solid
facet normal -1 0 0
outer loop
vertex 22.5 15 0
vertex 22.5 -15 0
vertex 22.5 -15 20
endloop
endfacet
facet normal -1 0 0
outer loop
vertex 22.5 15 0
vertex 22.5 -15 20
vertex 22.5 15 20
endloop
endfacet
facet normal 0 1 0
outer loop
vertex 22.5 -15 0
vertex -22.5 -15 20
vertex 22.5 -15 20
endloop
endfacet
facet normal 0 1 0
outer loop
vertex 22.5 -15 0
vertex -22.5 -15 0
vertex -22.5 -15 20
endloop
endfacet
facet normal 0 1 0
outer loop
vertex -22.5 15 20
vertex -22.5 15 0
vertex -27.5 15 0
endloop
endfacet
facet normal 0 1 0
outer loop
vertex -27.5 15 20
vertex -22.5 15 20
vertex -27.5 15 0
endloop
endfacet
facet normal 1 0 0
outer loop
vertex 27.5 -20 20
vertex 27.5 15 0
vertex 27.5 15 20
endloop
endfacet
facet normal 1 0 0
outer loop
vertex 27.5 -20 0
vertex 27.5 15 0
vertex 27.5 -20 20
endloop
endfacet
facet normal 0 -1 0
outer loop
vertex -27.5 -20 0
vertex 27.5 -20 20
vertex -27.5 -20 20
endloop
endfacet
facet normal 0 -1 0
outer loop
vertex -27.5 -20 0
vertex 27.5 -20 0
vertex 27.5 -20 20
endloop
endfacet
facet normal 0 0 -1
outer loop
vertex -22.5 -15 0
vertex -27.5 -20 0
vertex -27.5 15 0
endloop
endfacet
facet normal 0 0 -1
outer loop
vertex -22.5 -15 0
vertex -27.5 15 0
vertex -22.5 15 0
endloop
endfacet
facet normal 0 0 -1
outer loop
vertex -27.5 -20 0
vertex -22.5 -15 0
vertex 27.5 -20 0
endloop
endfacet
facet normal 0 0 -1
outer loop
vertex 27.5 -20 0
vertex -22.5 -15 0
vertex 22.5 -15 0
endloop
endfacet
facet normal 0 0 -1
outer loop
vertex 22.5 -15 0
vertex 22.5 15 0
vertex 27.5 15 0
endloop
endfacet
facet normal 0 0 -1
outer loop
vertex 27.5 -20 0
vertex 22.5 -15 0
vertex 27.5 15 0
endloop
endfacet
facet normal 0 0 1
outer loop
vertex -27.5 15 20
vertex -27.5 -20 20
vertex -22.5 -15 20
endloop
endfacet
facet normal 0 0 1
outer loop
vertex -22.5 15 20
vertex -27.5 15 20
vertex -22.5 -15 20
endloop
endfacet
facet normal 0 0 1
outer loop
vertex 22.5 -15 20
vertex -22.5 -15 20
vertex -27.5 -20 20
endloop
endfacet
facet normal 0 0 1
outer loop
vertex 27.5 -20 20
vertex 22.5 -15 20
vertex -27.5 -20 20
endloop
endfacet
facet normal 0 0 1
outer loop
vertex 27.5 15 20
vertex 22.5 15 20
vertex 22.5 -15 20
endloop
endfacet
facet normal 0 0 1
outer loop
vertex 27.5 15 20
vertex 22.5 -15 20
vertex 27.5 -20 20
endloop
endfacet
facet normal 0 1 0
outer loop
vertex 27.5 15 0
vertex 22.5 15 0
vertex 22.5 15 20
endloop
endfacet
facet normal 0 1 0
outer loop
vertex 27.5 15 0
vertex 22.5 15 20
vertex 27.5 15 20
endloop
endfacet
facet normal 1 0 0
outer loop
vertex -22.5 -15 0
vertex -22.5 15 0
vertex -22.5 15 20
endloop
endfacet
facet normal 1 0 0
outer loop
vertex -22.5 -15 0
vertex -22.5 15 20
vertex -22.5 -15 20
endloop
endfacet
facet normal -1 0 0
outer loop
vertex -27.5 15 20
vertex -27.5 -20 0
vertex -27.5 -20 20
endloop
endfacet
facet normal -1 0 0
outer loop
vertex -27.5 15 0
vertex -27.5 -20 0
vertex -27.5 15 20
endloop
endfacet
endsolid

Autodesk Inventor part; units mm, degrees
ref_plane "YZ Plane" through (0, 0, 0) normal (1, 0, 0) x (0, 1, 0)
ref_plane "XZ Plane" through (0, 0, 0) normal (0, 1, 0) x (-1, 0, 0)
ref_plane "XY Plane" through (0, 0, 0) normal (0, 0, 1) x (1, 0, 0)
sketch "Sketch1" plane through (0, 0, 0) normal (0, 0, 1) x (1, 0, 0)
  line L0 (22.5, 15) -> (-22.5, 15) construction
  line L1 (-22.5, 15) -> (-22.5, -15)
  line L2 (-22.5, -15) -> (22.5, -15)
  line L3 (22.5, -15) -> (22.5, 15)
  line L4 (22.5, 15) -> (-22.5, -15) construction
  line L5 (-22.5, 15) -> (22.5, -15) construction
  line L6 (-27.5, -20) -> (-27.5, 15)
  line L7 (-27.5, 20) -> (27.5, 20) construction
  line L8 (27.5, 20) -> (27.5, 15) construction
  line L9 (27.5, -20) -> (-27.5, -20)
  line L10 (-22.5, 15) -> (-27.5, 15)
  line L11 (22.5, 15) -> (27.5, 15)
  line L12 (-27.5, 15) -> (-27.5, 20) construction
  line L13 (27.5, 15) -> (27.5, -20)
  point P0 (0, 0)
  dimension "d0" = 45
  dimension "d1" = 30
  dimension "d2" = 5
  dimension "d3" = 5
  dimension "d4" = 5
  dimension "d5" = 40
extrude "Extrusion1" add sketch "Sketch1" along normal blind 20
properties part number "track z2043"
